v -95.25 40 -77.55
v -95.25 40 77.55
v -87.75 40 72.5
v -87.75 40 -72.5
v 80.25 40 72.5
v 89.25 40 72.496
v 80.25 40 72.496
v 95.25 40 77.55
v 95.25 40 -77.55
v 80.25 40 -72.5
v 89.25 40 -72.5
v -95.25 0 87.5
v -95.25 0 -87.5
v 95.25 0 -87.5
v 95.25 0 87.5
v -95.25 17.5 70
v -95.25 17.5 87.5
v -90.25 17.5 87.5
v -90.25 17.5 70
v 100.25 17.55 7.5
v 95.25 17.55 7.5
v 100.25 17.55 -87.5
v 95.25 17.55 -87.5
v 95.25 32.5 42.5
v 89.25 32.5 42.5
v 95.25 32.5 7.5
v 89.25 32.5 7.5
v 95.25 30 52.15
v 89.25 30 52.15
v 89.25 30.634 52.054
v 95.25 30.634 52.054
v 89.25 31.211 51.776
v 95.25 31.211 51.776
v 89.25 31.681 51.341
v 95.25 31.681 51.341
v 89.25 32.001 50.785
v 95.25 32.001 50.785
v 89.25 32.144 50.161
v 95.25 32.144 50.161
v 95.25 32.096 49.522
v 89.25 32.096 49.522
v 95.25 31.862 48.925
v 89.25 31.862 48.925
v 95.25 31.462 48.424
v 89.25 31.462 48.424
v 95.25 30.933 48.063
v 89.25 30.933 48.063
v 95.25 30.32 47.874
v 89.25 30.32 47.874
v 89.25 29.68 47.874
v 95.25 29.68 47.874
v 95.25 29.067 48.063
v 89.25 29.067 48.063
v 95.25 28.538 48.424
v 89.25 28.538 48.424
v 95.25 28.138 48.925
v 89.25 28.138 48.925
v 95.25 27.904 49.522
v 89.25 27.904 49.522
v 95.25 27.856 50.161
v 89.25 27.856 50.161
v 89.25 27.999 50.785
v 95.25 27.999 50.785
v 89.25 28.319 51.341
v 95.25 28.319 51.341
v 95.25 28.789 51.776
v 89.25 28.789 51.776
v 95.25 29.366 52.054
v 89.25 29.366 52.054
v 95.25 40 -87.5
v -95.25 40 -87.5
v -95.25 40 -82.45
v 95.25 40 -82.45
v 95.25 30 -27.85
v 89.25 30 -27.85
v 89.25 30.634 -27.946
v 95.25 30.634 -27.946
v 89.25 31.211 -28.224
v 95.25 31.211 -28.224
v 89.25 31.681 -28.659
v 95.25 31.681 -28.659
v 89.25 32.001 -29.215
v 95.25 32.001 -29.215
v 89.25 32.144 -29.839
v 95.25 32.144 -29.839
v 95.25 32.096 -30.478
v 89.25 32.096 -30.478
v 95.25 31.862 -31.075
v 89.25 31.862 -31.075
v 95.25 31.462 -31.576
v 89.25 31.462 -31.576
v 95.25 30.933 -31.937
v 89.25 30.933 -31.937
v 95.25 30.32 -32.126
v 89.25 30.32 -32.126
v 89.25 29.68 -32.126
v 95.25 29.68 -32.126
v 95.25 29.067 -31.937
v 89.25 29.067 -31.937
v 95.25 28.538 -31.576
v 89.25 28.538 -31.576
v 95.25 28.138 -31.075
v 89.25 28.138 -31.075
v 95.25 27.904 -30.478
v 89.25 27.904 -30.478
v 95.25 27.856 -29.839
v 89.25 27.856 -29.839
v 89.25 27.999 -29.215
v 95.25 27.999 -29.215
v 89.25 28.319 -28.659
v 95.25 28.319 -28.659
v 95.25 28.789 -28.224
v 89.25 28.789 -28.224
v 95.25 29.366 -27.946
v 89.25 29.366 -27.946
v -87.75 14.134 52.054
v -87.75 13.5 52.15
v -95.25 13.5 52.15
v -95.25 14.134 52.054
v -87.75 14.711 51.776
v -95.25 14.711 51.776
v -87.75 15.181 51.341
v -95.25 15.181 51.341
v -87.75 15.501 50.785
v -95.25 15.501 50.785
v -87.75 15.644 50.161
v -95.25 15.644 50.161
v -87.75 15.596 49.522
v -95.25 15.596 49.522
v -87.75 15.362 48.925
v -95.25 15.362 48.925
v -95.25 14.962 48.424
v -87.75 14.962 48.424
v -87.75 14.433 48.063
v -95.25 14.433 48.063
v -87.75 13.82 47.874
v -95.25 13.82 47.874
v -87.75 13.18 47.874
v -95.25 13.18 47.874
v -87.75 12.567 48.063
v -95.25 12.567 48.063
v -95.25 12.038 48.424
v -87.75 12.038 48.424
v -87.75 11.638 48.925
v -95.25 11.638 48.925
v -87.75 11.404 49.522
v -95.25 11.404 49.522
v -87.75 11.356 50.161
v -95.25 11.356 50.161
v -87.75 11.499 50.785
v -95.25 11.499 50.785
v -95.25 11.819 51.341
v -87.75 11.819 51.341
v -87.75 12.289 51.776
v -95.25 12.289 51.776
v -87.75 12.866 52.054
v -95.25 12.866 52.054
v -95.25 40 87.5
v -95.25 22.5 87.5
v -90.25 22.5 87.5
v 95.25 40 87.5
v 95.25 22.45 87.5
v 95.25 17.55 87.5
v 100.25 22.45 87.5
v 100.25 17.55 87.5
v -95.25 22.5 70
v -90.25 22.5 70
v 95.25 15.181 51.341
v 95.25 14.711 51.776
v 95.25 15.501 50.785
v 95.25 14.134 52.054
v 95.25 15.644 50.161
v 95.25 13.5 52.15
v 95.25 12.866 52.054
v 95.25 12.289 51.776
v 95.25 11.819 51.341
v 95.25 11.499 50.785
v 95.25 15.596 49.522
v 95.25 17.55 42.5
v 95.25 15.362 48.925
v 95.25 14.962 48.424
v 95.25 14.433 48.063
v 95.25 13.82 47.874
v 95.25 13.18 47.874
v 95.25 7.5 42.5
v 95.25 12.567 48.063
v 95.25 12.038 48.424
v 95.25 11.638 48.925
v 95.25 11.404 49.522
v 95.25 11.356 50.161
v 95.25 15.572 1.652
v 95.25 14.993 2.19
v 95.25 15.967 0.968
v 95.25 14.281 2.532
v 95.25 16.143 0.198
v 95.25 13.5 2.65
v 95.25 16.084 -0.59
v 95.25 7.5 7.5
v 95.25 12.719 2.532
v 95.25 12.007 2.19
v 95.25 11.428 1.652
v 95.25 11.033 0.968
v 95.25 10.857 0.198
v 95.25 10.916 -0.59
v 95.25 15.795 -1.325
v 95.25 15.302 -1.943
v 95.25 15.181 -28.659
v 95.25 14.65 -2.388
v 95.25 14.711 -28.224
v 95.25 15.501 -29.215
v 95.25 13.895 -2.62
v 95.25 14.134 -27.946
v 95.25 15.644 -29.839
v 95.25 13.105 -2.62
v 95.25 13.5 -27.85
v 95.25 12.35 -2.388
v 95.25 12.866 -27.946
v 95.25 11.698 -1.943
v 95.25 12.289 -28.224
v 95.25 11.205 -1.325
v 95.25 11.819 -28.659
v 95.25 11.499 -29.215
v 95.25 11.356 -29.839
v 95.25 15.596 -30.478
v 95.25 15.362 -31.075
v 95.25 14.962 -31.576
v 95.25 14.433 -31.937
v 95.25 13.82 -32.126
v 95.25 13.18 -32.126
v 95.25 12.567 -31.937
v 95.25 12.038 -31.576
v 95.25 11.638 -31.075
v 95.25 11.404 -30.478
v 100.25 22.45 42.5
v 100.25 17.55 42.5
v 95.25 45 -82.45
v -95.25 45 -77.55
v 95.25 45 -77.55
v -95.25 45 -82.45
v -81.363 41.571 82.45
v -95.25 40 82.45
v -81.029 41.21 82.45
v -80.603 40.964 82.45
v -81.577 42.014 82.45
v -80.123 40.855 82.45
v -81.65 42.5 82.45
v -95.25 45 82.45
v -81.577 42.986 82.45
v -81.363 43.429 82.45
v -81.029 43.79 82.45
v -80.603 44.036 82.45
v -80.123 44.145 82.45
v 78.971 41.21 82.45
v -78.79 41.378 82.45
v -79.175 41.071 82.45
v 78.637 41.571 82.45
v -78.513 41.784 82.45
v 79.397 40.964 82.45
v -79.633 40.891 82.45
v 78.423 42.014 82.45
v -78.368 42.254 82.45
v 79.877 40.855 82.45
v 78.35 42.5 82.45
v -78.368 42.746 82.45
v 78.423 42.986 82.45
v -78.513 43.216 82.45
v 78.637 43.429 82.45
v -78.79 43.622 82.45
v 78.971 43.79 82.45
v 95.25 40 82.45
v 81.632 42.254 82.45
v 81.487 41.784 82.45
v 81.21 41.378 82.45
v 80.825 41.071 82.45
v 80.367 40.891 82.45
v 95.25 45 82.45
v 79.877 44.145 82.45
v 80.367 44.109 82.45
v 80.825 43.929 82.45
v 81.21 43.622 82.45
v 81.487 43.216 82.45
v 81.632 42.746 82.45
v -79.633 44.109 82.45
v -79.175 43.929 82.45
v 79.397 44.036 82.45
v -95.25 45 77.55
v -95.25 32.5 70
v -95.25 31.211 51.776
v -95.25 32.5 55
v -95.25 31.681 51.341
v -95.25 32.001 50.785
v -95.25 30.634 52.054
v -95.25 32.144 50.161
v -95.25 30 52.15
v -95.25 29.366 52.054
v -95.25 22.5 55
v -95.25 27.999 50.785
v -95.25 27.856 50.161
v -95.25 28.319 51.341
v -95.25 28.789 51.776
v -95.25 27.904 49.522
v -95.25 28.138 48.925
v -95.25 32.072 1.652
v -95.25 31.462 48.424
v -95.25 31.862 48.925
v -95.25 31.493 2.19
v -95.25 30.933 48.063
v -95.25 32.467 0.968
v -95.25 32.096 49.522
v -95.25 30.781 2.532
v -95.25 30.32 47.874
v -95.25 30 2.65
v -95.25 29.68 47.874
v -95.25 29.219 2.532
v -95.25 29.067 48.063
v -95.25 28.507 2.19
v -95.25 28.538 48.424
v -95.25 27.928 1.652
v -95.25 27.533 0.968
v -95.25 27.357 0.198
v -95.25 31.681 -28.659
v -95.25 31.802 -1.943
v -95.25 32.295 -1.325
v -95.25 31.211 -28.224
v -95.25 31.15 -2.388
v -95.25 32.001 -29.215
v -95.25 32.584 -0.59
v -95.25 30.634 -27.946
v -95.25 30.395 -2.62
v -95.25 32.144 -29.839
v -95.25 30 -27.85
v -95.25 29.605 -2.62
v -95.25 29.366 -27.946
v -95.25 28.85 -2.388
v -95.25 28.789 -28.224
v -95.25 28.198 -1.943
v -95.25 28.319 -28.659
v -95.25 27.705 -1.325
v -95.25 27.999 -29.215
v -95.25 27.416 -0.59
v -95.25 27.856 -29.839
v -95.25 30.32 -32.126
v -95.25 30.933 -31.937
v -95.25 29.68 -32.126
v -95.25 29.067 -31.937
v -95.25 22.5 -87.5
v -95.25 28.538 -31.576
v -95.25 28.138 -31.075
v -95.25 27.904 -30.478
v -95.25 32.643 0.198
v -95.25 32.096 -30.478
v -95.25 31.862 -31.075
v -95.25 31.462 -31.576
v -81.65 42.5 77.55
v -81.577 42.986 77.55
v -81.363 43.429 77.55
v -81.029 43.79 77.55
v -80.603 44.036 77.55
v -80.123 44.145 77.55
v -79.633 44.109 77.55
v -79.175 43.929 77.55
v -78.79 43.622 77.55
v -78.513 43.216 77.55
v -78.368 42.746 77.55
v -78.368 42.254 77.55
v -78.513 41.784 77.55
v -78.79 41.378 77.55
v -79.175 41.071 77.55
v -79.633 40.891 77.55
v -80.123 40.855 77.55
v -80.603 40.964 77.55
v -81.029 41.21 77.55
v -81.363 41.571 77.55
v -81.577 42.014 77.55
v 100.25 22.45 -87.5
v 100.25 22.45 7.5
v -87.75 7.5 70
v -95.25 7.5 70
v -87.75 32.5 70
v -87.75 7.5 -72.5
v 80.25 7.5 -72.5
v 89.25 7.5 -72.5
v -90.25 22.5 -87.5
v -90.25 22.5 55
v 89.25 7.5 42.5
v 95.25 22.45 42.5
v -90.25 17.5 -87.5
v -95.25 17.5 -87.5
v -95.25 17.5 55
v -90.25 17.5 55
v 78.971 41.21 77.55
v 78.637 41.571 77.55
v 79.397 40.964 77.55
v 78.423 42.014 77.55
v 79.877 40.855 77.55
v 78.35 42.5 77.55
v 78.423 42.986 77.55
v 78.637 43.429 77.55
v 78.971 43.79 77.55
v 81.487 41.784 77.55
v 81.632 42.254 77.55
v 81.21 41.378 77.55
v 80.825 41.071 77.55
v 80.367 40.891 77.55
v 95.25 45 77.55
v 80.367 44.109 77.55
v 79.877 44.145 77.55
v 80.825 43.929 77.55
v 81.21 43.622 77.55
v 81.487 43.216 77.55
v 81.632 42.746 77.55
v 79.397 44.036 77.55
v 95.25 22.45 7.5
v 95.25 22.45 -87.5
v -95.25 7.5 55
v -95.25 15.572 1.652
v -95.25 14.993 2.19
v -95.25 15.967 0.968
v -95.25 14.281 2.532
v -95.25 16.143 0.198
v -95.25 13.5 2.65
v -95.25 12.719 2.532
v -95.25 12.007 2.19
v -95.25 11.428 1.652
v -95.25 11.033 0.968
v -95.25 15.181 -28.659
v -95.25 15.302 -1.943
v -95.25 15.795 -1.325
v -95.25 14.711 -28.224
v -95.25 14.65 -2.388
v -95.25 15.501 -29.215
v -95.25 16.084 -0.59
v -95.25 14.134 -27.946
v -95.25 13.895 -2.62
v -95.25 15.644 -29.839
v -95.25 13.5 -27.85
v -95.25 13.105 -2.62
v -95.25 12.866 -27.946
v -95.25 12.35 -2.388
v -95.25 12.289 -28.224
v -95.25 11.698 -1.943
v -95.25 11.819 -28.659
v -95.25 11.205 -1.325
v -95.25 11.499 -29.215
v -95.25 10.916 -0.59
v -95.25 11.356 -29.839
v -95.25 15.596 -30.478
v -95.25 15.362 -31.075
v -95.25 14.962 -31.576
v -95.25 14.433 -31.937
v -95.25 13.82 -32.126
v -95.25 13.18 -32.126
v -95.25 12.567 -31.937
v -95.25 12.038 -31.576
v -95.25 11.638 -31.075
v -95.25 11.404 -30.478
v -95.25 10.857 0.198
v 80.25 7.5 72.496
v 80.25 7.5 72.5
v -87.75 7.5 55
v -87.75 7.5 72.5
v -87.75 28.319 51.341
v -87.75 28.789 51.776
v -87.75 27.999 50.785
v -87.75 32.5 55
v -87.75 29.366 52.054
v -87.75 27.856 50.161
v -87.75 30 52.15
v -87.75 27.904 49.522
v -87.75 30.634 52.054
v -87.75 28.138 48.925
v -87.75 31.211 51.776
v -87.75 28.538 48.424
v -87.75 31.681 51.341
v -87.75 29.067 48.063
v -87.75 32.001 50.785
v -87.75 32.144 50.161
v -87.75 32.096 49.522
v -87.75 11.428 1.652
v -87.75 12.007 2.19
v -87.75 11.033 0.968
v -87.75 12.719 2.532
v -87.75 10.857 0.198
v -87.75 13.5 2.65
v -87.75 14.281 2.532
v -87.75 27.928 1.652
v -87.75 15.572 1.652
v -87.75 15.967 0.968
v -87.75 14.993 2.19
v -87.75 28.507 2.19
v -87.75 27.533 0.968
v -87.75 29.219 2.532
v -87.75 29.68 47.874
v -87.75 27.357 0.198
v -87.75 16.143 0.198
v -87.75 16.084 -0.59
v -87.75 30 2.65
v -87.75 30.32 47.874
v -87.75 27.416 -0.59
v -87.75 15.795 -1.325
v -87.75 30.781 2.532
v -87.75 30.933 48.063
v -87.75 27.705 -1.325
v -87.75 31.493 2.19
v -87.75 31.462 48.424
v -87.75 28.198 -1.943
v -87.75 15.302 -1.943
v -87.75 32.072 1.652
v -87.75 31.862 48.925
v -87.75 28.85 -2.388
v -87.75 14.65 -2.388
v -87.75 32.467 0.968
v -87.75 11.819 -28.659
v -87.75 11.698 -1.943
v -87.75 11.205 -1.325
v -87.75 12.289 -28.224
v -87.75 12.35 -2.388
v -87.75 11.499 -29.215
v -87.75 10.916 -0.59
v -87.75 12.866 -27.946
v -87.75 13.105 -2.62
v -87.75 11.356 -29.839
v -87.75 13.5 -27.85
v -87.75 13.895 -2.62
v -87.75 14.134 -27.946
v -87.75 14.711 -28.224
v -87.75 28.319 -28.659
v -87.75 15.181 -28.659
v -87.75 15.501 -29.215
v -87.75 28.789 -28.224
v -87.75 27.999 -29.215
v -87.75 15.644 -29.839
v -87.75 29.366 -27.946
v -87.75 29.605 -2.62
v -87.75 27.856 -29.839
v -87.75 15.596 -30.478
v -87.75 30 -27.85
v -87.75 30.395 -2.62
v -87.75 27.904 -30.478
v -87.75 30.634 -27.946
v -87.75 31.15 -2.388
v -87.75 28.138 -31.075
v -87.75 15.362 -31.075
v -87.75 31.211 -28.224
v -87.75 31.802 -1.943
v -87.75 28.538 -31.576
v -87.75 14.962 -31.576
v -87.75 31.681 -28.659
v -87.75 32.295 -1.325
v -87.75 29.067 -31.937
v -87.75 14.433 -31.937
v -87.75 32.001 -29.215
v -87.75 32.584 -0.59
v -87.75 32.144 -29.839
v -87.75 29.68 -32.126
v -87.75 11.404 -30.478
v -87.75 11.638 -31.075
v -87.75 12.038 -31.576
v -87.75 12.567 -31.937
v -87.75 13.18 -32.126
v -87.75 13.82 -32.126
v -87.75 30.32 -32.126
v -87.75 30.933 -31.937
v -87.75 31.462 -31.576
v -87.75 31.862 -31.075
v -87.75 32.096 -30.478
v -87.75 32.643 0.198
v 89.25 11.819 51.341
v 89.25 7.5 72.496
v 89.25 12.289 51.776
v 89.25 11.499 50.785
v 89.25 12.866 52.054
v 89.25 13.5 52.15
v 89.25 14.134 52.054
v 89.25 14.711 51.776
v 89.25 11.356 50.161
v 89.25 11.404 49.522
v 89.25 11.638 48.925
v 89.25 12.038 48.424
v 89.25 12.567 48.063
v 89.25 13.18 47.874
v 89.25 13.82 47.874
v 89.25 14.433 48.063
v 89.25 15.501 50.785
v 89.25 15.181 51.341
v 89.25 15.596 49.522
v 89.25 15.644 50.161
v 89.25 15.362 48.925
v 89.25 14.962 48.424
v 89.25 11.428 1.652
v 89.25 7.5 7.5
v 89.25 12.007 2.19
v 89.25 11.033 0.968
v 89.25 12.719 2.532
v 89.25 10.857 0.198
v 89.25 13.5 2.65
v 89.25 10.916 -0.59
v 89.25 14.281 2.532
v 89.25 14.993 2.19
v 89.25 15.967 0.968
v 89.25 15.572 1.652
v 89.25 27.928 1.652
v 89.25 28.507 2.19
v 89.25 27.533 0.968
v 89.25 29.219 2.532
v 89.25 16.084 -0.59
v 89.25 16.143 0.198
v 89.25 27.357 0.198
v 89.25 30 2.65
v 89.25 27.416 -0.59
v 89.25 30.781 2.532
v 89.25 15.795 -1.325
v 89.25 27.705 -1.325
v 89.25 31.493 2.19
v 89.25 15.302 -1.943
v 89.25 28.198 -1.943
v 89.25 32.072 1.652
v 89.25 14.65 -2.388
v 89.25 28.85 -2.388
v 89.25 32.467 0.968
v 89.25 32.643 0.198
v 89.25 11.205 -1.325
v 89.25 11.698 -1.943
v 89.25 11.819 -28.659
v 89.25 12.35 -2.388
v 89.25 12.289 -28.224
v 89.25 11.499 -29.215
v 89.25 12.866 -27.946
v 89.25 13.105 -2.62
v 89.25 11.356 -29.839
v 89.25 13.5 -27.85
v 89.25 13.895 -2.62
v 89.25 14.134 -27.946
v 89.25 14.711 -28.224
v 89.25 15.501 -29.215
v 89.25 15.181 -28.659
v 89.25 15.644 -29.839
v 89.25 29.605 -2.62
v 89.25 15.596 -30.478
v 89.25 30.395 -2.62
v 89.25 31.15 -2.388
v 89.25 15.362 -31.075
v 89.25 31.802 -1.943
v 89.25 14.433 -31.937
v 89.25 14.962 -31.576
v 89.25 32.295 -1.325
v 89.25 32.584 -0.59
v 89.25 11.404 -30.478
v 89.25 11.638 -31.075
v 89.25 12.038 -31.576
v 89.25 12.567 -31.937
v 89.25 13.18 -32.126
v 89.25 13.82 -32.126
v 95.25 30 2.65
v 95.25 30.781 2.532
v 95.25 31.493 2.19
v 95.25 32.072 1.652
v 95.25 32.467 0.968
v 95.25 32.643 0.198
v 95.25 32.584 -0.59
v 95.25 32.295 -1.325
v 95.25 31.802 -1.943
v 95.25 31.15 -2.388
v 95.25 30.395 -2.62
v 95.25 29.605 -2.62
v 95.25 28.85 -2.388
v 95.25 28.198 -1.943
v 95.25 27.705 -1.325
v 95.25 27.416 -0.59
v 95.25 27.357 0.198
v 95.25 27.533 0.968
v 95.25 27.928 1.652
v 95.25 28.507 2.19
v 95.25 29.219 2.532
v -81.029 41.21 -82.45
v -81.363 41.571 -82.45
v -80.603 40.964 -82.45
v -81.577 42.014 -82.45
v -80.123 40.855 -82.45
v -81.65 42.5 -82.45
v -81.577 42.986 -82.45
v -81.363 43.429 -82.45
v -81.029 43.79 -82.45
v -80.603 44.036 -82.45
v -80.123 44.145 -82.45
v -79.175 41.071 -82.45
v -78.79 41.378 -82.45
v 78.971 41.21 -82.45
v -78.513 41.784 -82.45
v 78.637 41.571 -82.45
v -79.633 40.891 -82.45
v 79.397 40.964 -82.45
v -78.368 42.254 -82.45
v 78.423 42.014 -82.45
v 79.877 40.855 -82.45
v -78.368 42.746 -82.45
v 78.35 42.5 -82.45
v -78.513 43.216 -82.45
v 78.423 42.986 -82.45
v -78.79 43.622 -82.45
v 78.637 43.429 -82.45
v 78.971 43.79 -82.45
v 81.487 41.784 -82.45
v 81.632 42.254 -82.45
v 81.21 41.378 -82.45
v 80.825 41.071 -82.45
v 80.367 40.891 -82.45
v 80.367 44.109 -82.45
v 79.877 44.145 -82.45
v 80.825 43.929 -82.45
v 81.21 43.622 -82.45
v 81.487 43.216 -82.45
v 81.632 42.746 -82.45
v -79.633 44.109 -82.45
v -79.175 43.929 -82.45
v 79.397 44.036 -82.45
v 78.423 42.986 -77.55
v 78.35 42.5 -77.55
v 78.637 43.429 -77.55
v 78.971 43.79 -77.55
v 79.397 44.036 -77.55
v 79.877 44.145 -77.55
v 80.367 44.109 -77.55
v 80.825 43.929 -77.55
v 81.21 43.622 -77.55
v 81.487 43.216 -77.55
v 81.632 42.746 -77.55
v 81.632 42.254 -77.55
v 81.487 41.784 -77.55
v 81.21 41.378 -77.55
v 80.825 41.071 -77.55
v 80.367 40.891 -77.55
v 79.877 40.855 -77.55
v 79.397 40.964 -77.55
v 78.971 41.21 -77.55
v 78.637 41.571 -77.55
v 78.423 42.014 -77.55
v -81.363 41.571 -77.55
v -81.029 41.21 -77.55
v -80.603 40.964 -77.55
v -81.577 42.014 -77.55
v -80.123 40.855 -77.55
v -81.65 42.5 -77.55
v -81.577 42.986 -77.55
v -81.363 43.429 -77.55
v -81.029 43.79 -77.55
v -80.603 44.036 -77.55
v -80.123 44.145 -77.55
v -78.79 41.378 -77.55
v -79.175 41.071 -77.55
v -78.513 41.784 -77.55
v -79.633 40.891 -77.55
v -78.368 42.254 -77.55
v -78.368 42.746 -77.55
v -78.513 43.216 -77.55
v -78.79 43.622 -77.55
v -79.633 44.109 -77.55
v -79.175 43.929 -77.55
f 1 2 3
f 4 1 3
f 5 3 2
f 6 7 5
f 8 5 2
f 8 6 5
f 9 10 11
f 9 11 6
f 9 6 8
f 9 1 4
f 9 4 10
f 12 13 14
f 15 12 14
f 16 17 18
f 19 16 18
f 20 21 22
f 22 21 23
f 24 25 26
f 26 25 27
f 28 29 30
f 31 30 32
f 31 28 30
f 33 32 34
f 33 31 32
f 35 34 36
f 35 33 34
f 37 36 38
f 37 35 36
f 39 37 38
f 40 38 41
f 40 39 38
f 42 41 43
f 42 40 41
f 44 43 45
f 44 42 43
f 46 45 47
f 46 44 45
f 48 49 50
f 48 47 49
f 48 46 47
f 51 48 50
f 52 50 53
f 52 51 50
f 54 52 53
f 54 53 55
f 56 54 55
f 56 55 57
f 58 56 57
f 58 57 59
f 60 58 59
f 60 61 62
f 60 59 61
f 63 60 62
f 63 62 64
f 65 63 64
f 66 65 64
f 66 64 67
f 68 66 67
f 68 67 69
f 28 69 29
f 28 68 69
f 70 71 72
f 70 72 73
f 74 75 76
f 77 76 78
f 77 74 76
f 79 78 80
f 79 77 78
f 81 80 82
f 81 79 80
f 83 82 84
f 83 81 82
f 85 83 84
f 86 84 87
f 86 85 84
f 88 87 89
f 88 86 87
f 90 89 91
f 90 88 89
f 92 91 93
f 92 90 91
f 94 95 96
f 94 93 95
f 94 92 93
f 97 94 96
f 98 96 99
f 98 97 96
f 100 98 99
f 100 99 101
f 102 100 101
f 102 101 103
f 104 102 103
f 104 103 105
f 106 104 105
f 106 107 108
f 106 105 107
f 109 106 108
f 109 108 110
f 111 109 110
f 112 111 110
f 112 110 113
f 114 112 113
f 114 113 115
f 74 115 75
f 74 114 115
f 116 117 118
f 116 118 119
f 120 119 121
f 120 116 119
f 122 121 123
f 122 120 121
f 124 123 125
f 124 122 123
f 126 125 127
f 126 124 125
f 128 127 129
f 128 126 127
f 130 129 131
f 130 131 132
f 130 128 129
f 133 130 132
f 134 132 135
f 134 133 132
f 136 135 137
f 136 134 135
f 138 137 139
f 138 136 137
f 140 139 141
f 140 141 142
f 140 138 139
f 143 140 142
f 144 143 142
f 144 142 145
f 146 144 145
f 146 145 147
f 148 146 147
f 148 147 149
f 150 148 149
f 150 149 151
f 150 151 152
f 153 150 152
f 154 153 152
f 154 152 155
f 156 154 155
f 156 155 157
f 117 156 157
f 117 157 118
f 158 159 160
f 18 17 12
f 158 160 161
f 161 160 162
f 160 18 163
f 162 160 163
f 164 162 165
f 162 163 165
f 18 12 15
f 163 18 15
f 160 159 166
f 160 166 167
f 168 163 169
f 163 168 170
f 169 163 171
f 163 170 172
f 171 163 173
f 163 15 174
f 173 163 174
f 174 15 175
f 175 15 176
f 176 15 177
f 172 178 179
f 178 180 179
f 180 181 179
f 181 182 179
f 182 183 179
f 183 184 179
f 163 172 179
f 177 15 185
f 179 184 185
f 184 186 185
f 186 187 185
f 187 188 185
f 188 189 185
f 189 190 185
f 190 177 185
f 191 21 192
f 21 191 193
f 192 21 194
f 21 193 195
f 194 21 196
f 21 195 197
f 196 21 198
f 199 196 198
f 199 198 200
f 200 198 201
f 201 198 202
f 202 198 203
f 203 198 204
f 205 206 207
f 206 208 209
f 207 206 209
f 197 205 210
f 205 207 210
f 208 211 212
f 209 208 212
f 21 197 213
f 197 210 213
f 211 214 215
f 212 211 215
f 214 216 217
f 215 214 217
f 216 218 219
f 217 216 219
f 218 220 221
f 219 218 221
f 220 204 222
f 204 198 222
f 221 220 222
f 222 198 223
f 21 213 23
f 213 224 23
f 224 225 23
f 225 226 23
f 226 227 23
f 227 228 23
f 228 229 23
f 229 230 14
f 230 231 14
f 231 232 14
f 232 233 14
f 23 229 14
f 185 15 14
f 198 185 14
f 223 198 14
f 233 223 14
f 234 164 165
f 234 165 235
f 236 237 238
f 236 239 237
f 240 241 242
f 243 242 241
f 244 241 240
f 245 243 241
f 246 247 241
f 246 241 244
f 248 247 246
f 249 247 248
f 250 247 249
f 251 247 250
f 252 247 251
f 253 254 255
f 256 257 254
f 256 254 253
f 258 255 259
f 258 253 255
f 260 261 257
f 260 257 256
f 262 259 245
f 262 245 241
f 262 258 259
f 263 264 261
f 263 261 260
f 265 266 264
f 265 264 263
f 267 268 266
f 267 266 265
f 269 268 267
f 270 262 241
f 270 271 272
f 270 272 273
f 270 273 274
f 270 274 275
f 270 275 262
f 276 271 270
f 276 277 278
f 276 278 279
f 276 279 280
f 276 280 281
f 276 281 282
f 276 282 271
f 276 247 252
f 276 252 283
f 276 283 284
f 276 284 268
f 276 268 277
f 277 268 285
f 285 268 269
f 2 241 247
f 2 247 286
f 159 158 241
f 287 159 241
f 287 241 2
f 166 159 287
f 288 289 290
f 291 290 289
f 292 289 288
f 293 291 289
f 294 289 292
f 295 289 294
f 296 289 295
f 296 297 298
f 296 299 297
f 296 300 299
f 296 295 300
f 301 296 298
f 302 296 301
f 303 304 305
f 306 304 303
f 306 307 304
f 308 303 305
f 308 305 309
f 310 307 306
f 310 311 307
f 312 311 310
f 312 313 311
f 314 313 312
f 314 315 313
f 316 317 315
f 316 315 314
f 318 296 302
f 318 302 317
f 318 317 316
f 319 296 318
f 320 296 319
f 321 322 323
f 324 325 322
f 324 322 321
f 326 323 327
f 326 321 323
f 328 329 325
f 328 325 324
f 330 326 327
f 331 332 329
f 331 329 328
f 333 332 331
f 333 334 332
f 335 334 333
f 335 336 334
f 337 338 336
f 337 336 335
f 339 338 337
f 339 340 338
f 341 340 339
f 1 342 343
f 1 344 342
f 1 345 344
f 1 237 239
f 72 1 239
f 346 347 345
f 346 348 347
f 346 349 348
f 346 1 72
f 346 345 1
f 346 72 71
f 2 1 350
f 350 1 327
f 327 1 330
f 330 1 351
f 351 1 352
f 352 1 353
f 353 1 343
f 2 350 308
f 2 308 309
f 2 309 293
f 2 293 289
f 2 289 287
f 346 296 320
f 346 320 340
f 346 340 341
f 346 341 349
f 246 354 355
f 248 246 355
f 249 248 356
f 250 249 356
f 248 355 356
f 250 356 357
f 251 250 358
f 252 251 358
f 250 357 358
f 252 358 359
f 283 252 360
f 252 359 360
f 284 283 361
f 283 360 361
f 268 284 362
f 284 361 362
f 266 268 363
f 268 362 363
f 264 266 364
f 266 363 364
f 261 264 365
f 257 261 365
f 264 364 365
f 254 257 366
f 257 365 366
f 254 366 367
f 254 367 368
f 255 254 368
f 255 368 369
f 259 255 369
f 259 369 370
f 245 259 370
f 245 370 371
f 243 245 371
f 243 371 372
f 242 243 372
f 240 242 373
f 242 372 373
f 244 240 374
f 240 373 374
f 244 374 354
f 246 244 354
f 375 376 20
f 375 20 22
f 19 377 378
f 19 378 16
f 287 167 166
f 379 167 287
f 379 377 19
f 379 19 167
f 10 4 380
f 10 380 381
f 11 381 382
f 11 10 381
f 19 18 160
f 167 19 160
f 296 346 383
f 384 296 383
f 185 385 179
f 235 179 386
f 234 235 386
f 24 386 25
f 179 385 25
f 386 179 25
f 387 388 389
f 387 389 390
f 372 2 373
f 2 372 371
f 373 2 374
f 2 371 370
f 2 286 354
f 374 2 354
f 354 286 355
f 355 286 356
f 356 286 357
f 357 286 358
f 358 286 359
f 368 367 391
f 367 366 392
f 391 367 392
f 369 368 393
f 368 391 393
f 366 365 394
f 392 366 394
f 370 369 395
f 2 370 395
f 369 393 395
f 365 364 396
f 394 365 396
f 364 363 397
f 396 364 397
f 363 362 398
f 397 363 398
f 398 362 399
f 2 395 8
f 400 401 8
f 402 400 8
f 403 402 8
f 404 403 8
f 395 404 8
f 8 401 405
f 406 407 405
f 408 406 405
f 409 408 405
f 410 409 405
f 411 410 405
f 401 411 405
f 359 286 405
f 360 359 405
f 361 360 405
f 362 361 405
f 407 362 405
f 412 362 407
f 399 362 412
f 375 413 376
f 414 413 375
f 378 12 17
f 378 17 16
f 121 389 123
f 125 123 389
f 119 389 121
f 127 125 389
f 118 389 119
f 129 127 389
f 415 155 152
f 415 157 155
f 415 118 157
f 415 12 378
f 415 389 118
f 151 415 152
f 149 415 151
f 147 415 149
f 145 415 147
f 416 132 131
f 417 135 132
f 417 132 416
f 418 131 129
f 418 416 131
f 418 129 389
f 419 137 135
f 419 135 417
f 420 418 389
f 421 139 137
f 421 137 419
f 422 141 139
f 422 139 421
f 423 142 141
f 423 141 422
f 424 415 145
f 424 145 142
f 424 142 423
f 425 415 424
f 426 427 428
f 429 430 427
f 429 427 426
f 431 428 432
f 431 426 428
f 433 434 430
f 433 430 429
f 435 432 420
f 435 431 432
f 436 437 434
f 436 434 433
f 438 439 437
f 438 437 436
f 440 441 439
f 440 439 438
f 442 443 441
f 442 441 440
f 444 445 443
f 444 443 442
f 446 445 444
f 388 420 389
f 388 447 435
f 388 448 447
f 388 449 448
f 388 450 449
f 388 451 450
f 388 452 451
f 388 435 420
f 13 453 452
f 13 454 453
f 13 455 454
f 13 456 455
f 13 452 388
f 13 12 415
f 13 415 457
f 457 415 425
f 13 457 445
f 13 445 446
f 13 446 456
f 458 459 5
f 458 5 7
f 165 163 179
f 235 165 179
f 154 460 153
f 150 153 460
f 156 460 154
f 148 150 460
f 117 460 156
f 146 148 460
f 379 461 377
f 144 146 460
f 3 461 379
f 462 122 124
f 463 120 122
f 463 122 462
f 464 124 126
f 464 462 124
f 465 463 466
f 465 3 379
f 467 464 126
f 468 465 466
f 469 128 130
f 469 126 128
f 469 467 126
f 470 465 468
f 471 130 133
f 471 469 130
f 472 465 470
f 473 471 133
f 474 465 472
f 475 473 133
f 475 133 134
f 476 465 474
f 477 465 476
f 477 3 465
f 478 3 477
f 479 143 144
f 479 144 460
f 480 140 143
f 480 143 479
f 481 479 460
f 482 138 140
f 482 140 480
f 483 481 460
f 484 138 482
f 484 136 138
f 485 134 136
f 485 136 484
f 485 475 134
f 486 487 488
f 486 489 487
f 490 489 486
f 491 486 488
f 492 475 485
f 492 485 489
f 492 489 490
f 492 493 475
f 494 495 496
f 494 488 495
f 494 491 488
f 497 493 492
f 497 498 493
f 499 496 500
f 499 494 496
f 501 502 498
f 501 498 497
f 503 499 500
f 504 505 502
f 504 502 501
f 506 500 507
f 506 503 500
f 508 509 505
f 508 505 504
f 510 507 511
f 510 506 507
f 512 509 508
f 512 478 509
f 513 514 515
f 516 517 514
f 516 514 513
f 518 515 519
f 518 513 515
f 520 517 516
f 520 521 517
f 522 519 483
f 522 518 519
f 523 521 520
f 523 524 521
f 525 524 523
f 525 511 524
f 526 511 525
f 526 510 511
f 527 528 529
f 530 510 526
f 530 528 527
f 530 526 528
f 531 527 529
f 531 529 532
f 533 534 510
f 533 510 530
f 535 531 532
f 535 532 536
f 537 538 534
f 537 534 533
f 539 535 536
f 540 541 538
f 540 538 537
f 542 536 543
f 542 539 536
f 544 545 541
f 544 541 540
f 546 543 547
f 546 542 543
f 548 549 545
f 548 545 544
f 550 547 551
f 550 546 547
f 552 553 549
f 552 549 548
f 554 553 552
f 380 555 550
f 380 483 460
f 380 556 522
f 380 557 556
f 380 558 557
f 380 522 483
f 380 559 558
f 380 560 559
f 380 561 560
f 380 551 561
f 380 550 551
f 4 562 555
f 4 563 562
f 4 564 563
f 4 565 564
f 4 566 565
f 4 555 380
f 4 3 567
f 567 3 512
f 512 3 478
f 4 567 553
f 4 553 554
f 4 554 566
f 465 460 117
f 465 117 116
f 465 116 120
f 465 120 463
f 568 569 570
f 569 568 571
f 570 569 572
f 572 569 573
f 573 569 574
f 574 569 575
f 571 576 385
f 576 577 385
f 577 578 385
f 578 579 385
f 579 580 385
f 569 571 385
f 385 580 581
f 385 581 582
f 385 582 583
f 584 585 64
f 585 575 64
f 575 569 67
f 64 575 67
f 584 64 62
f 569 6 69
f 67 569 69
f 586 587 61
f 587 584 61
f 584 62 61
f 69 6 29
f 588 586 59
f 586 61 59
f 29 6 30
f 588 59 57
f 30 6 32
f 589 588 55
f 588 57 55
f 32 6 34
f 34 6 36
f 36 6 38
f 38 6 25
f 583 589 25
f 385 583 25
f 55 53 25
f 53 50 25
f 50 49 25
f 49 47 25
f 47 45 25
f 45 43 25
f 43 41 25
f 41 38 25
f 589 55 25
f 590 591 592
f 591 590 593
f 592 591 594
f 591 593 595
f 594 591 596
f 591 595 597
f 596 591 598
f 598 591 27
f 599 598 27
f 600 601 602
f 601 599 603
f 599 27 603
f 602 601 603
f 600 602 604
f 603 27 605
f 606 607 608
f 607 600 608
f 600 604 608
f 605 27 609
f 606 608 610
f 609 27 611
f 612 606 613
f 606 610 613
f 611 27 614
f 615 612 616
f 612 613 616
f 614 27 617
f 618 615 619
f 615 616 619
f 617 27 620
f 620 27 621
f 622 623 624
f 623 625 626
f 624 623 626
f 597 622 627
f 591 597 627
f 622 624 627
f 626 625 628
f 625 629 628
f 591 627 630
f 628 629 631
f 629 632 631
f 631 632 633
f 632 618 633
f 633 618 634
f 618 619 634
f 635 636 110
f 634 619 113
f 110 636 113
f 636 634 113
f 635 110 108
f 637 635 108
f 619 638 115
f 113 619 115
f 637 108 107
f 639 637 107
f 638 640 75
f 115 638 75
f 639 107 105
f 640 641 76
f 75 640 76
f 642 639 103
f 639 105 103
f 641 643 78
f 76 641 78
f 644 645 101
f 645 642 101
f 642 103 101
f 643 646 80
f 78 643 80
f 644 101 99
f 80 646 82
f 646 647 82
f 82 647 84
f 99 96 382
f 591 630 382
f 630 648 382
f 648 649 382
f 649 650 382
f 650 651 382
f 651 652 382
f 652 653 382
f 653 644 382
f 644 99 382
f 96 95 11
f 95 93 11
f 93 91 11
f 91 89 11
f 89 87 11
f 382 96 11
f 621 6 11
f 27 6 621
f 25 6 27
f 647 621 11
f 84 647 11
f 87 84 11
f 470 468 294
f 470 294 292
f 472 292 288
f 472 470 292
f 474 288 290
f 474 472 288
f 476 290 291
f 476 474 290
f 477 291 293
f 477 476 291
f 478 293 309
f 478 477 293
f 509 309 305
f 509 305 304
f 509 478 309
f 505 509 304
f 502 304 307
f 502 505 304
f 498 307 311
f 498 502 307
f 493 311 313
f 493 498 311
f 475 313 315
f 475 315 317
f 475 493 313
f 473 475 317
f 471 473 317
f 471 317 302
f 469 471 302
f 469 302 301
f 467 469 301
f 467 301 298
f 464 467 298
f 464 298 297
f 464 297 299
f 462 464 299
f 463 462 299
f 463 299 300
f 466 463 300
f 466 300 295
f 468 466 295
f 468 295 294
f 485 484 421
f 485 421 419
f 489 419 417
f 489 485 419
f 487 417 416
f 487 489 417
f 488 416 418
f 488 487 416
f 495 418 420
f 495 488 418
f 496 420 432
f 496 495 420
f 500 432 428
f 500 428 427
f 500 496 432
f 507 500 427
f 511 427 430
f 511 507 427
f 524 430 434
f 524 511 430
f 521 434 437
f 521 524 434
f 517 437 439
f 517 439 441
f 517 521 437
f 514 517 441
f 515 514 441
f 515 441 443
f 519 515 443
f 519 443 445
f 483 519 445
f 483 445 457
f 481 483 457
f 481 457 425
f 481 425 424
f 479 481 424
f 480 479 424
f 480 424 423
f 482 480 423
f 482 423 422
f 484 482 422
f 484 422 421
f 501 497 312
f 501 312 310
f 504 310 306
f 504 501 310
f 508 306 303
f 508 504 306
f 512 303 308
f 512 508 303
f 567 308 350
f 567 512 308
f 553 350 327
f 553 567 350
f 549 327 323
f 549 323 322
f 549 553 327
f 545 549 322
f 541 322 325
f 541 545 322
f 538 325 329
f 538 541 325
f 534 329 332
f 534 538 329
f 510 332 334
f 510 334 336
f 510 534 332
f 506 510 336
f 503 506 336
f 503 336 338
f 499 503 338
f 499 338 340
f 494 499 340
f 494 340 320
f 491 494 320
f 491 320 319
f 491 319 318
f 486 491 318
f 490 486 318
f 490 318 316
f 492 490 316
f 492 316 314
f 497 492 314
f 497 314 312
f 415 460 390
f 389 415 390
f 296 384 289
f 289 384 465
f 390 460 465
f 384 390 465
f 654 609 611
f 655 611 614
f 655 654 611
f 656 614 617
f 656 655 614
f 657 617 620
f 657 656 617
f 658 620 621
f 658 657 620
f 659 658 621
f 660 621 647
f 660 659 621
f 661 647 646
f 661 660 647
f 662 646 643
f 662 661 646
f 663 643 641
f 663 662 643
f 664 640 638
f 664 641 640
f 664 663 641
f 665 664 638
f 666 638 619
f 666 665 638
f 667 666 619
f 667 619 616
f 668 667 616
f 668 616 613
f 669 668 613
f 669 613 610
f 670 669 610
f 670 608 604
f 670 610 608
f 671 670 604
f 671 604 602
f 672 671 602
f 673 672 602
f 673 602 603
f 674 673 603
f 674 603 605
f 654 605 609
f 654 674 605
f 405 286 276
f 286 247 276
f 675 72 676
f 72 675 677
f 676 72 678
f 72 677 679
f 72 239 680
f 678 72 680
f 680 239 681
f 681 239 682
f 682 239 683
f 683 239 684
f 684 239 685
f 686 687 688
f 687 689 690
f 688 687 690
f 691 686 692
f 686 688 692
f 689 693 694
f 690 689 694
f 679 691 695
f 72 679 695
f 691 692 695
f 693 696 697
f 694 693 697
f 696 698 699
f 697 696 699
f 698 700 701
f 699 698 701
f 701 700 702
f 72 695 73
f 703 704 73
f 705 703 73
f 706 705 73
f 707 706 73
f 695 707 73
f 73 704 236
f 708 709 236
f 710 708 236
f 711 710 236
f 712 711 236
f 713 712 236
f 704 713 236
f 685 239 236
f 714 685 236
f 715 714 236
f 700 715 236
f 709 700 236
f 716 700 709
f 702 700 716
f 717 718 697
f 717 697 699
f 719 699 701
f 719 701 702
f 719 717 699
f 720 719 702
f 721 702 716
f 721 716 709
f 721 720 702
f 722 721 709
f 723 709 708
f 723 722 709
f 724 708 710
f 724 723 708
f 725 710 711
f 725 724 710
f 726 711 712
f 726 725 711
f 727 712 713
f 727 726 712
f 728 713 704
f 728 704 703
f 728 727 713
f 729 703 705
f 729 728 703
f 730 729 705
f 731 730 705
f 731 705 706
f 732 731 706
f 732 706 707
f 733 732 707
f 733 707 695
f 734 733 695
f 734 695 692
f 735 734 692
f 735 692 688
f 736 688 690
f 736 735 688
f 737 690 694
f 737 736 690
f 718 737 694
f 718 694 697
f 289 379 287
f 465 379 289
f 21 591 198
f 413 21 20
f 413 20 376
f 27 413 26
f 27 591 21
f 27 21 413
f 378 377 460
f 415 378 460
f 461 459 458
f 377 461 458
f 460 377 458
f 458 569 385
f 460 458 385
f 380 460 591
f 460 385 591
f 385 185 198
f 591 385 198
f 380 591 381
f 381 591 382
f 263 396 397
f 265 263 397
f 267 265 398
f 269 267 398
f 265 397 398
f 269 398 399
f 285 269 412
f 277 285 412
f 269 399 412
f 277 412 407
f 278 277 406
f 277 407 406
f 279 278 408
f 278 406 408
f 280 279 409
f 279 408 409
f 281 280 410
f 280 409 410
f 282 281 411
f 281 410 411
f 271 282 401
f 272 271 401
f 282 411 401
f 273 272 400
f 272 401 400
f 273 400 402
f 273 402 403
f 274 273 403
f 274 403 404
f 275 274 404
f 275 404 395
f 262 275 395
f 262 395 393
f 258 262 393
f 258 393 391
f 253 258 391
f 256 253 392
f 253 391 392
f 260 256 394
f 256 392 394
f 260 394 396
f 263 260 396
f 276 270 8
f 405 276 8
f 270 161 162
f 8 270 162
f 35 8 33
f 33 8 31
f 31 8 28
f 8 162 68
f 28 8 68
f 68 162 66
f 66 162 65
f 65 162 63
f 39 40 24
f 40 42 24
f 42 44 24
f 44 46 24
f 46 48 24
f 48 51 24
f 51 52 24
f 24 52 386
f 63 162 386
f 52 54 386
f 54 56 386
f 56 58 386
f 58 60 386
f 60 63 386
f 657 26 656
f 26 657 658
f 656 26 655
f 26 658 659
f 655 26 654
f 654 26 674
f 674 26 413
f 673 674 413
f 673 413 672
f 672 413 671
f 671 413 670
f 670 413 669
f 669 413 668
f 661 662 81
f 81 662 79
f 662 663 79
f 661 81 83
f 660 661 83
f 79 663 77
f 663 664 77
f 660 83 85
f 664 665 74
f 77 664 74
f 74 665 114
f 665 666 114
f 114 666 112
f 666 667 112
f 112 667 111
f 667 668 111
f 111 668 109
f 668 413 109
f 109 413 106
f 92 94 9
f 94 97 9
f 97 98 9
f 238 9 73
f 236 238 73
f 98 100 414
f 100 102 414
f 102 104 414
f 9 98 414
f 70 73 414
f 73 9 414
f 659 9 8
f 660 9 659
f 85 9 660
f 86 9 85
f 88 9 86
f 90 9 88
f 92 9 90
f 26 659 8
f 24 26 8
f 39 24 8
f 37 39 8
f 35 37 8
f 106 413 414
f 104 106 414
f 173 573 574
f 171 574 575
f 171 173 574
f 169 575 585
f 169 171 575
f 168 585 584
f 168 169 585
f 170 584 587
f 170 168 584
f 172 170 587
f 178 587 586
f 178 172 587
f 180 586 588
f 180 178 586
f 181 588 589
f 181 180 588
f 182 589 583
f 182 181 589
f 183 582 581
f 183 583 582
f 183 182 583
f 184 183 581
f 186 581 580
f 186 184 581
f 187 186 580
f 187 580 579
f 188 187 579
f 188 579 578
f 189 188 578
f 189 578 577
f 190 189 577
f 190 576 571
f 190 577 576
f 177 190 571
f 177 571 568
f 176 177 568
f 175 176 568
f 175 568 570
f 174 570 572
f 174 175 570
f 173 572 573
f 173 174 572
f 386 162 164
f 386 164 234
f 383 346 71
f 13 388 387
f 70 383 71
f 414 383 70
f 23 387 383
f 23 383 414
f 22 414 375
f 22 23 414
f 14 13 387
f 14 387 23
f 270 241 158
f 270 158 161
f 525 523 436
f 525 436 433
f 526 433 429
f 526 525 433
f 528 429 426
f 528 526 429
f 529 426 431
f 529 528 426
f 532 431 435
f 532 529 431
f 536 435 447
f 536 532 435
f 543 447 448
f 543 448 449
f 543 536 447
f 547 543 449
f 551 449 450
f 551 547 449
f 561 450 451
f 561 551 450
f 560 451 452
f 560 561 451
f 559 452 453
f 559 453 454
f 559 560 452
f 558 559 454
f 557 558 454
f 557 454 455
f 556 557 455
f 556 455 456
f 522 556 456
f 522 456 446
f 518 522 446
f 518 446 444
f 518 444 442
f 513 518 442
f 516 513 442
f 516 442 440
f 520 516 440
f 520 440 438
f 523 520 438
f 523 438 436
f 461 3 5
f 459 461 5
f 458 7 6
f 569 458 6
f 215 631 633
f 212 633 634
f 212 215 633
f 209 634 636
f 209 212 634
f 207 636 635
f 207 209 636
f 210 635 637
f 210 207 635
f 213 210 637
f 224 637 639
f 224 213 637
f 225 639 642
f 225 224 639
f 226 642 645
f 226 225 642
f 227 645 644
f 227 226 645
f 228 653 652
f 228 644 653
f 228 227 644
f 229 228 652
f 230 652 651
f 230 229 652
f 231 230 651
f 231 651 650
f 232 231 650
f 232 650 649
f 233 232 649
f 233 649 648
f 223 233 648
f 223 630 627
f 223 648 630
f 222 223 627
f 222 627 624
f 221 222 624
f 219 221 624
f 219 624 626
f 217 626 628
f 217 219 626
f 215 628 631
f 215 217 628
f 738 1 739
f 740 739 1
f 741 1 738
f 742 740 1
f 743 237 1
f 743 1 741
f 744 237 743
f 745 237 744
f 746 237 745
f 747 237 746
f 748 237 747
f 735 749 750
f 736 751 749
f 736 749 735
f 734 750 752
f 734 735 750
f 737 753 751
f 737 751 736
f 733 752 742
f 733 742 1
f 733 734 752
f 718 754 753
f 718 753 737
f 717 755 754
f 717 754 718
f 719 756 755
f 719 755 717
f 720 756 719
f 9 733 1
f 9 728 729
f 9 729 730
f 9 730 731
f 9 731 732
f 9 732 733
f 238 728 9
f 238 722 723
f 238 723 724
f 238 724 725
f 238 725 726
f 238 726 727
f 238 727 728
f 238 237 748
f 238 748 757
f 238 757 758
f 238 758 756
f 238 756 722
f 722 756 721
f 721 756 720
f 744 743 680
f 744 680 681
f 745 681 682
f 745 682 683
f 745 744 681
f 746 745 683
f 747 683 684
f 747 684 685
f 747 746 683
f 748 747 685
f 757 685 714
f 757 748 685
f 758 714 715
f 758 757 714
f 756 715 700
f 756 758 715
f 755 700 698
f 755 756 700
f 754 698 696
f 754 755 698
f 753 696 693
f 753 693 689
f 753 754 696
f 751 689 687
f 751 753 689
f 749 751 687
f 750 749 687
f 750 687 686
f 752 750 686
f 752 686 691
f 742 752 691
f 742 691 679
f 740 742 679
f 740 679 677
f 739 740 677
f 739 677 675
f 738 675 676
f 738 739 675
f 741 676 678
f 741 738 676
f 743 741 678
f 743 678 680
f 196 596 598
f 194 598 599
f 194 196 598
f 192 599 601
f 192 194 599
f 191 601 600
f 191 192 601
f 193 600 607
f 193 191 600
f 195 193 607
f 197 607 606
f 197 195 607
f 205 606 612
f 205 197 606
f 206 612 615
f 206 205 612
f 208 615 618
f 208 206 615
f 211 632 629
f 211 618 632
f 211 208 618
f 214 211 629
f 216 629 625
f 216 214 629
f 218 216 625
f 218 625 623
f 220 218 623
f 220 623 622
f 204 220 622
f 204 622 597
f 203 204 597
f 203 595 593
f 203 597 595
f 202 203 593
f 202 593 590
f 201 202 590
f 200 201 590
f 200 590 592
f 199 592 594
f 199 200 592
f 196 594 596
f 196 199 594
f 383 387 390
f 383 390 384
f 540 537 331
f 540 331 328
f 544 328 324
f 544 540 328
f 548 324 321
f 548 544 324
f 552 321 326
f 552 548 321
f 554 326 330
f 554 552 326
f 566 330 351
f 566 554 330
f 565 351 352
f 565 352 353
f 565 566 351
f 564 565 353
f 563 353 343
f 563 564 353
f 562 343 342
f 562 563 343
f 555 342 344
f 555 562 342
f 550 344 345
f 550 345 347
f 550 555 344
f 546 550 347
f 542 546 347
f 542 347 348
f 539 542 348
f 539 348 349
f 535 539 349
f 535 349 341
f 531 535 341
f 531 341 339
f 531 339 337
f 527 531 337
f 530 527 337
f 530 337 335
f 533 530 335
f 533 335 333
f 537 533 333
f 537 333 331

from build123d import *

# Parameters (mm, degrees)
SKETCH1_W           = 190.5
SKETCH1_H           = 175
BOSS_EXTRUDE1_DEPTH = 40
SHELL1_T            = -15
SKETCH2_W           = 175
SKETCH2_H           = 4.9
BOSS_EXTRUDE2_DEPTH = 5
SKETCH3_W           = 5
SKETCH3_H           = 5
CUT_EXTRUDE1_DEPTH  = 175
SKETCH4_W           = 7.5
SKETCH4_H           = 145
CUT_EXTRUDE2_DEPTH  = 25
CUT_EXTRUDE3_START  = -190.5
SKETCH5_R           = 2.65
SKETCH5_R_2         = 2.15
CUT_EXTRUDE3_DEPTH  = 190.5
SKETCH6_W           = 168
SKETCH6_H           = 145
CUT_EXTRUDE4_DEPTH  = 7.5
CUT_EXTRUDE5_REACH  = 140.947
SKETCH7_W           = 9
SKETCH7_H           = 144.996152815
BOSS_EXTRUDE3_START = -7.5
SKETCH9_W           = 190.5
SKETCH9_H           = 5
BOSS_EXTRUDE3_DEPTH = 2.45
SKETCH11_R          = 1.65
CUT_EXTRUDE7_DEPTH  = 4.9
SKETCH12_W          = 35
SKETCH12_H          = 25
CUT_EXTRUDE8_DEPTH  = 213.19154083
CUT_EXTRUDE9_REACH  = 214.192
SKETCH13_W          = 15
SKETCH13_H          = 25


with BuildPart() as part:
    # Sketch1 → Boss-Extrude1 (new body)
    with BuildSketch(Plane(origin=(0, 0, 0), x_dir=(1, 0, 0), z_dir=(0, 1, 0))):
        Rectangle(SKETCH1_W, SKETCH1_H)
    extrude(amount=BOSS_EXTRUDE1_DEPTH)

    # Shell1
    shell1_openings = [part.faces().sort_by_distance(p)[0] for p in [
        (0, 40, 0),
    ]]
    offset(amount=SHELL1_T, openings=shell1_openings, kind=Kind.INTERSECTION)

    # Sketch2 → Boss-Extrude2 (add)
    with BuildSketch(Plane(origin=(95.25, 0, 0), x_dir=(0, 0, -1), z_dir=(1, 0, 0))):
        with Locations((0, 20)):
            Rectangle(SKETCH2_W, SKETCH2_H)
    extrude(amount=BOSS_EXTRUDE2_DEPTH)

    # Sketch3 → Cut-Extrude1 (cut)
    with BuildSketch(Plane.XY.offset(87.5)):
        with Locations((-92.75, 20)):
            Rectangle(SKETCH3_W, SKETCH3_H)
    extrude(amount=-CUT_EXTRUDE1_DEPTH, mode=Mode.SUBTRACT)

    # Sketch4 → Cut-Extrude2 (cut)
    with BuildSketch(Plane(origin=(0, 40, 0), x_dir=(1, 0, 0), z_dir=(0, 1, 0))):
        with Locations((-84, 0)):
            Rectangle(SKETCH4_W, SKETCH4_H)
    extrude(amount=-CUT_EXTRUDE2_DEPTH, mode=Mode.SUBTRACT)

    # Sketch5 → Cut-Extrude3 (cut)
    with BuildSketch(Plane.ZY.offset(95.25).offset(CUT_EXTRUDE3_START)):
        with Locations((0, 30)):
            Circle(SKETCH5_R)
        with Locations((-30, 30)):
            Circle(SKETCH5_R_2)
        with Locations((50, 30)):
            Circle(SKETCH5_R_2)
        with Locations((-30, 13.5)):
            Circle(SKETCH5_R_2)
        with Locations((0, 13.5)):
            Circle(SKETCH5_R)
        with Locations((50, 13.5)):
            Circle(SKETCH5_R_2)
    cut_extrude3 = extrude(amount=CUT_EXTRUDE3_DEPTH, mode=Mode.SUBTRACT)

    # Sketch6 → Cut-Extrude4 (cut)
    with BuildSketch(Plane(origin=(0, 15, 0), x_dir=(1, 0, 0), z_dir=(0, 1, 0))):
        with Locations((-3.75, 0)):
            Rectangle(SKETCH6_W, SKETCH6_H)
    extrude(amount=-CUT_EXTRUDE4_DEPTH, mode=Mode.SUBTRACT)

    # Mirror1: Cut-Extrude3 across plane
    add(cut_extrude3.mirror(Plane(origin=(0, 0, 0), x_dir=(0, 0, 1), z_dir=(1, 0, 0))), mode=Mode.SUBTRACT)

    # Cut-Extrude5: up to this face of the body (flat: up to its plane)
    cut_extrude5_end = Plane(part.part.faces().sort_by_distance((-3.75, 7.5, 0))[0])
    # Sketch7 → Cut-Extrude5 (cut, up to the picked face)
    with BuildSketch(Plane(origin=(0, 40, 0), x_dir=(1, 0, 0), z_dir=(0, 1, 0)), mode=Mode.PRIVATE) as cut_extrude5_sk1:
        with Locations((84.75, 0.001923592)):
            Rectangle(SKETCH7_W, SKETCH7_H)
    cut_extrude5_tool1 = split(extrude(cut_extrude5_sk1.sketch, amount=-CUT_EXTRUDE5_REACH, mode=Mode.PRIVATE), bisect_by=cut_extrude5_end, keep=Keep.BOTH, mode=Mode.PRIVATE)
    add(cut_extrude5_tool1.solids().sort_by(Axis((84.75, 40, -0.001924), (0, -1, 0)))[0], mode=Mode.SUBTRACT)

    # Sketch9 → Boss-Extrude3 (add, symmetric)
    with BuildSketch(Plane.XY.offset(87.5).offset(BOSS_EXTRUDE3_START)):
        with Locations((0, 42.5)):
            Rectangle(SKETCH9_W, SKETCH9_H)
    boss_extrude3 = extrude(amount=BOSS_EXTRUDE3_DEPTH, both=True)

    # Sketch11 → Cut-Extrude7 (cut)
    with BuildSketch(Plane(origin=(0, 0, 77.55), x_dir=(-1, 0, 0), z_dir=(0, 0, -1))):
        with Locations((-80, 42.5)):
            Circle(SKETCH11_R)
        with Locations((80, 42.5)):
            Circle(SKETCH11_R)
    cut_extrude7 = extrude(amount=-CUT_EXTRUDE7_DEPTH, mode=Mode.SUBTRACT)

    # Mirror2: Boss-Extrude3, Cut-Extrude7 across plane
    add(boss_extrude3.mirror(Plane.XY))
    add(cut_extrude7.mirror(Plane.XY), mode=Mode.SUBTRACT)

    # Sketch12 → Cut-Extrude8 (cut, through all)
    with BuildSketch(Plane(origin=(-87.75, 0, 0), x_dir=(0, 0, -1), z_dir=(1, 0, 0))):
        with Locations((-25, 20)):
            Rectangle(SKETCH12_W, SKETCH12_H)
    extrude(amount=CUT_EXTRUDE8_DEPTH, mode=Mode.SUBTRACT)

    # Cut-Extrude9: up to this face of the body (flat: up to its plane)
    cut_extrude9_end = Plane(part.part.faces().sort_by_distance((-95.25, 8.669388557, -0.096447103))[0])
    # Sketch13 → Cut-Extrude9 (cut, up to the picked face)
    with BuildSketch(Plane(origin=(-87.75, 0, 0), x_dir=(0, 0, -1), z_dir=(1, 0, 0)), mode=Mode.PRIVATE) as cut_extrude9_sk1:
        with Locations((-62.5, 20)):
            Rectangle(SKETCH13_W, SKETCH13_H)
    cut_extrude9_tool1 = split(extrude(cut_extrude9_sk1.sketch, amount=-CUT_EXTRUDE9_REACH, mode=Mode.PRIVATE), bisect_by=cut_extrude9_end, keep=Keep.BOTH, mode=Mode.PRIVATE)
    add(cut_extrude9_tool1.solids().sort_by(Axis((-87.75, 20, 62.5), (-1, 0, 0)))[0], mode=Mode.SUBTRACT)


solid = part.part
